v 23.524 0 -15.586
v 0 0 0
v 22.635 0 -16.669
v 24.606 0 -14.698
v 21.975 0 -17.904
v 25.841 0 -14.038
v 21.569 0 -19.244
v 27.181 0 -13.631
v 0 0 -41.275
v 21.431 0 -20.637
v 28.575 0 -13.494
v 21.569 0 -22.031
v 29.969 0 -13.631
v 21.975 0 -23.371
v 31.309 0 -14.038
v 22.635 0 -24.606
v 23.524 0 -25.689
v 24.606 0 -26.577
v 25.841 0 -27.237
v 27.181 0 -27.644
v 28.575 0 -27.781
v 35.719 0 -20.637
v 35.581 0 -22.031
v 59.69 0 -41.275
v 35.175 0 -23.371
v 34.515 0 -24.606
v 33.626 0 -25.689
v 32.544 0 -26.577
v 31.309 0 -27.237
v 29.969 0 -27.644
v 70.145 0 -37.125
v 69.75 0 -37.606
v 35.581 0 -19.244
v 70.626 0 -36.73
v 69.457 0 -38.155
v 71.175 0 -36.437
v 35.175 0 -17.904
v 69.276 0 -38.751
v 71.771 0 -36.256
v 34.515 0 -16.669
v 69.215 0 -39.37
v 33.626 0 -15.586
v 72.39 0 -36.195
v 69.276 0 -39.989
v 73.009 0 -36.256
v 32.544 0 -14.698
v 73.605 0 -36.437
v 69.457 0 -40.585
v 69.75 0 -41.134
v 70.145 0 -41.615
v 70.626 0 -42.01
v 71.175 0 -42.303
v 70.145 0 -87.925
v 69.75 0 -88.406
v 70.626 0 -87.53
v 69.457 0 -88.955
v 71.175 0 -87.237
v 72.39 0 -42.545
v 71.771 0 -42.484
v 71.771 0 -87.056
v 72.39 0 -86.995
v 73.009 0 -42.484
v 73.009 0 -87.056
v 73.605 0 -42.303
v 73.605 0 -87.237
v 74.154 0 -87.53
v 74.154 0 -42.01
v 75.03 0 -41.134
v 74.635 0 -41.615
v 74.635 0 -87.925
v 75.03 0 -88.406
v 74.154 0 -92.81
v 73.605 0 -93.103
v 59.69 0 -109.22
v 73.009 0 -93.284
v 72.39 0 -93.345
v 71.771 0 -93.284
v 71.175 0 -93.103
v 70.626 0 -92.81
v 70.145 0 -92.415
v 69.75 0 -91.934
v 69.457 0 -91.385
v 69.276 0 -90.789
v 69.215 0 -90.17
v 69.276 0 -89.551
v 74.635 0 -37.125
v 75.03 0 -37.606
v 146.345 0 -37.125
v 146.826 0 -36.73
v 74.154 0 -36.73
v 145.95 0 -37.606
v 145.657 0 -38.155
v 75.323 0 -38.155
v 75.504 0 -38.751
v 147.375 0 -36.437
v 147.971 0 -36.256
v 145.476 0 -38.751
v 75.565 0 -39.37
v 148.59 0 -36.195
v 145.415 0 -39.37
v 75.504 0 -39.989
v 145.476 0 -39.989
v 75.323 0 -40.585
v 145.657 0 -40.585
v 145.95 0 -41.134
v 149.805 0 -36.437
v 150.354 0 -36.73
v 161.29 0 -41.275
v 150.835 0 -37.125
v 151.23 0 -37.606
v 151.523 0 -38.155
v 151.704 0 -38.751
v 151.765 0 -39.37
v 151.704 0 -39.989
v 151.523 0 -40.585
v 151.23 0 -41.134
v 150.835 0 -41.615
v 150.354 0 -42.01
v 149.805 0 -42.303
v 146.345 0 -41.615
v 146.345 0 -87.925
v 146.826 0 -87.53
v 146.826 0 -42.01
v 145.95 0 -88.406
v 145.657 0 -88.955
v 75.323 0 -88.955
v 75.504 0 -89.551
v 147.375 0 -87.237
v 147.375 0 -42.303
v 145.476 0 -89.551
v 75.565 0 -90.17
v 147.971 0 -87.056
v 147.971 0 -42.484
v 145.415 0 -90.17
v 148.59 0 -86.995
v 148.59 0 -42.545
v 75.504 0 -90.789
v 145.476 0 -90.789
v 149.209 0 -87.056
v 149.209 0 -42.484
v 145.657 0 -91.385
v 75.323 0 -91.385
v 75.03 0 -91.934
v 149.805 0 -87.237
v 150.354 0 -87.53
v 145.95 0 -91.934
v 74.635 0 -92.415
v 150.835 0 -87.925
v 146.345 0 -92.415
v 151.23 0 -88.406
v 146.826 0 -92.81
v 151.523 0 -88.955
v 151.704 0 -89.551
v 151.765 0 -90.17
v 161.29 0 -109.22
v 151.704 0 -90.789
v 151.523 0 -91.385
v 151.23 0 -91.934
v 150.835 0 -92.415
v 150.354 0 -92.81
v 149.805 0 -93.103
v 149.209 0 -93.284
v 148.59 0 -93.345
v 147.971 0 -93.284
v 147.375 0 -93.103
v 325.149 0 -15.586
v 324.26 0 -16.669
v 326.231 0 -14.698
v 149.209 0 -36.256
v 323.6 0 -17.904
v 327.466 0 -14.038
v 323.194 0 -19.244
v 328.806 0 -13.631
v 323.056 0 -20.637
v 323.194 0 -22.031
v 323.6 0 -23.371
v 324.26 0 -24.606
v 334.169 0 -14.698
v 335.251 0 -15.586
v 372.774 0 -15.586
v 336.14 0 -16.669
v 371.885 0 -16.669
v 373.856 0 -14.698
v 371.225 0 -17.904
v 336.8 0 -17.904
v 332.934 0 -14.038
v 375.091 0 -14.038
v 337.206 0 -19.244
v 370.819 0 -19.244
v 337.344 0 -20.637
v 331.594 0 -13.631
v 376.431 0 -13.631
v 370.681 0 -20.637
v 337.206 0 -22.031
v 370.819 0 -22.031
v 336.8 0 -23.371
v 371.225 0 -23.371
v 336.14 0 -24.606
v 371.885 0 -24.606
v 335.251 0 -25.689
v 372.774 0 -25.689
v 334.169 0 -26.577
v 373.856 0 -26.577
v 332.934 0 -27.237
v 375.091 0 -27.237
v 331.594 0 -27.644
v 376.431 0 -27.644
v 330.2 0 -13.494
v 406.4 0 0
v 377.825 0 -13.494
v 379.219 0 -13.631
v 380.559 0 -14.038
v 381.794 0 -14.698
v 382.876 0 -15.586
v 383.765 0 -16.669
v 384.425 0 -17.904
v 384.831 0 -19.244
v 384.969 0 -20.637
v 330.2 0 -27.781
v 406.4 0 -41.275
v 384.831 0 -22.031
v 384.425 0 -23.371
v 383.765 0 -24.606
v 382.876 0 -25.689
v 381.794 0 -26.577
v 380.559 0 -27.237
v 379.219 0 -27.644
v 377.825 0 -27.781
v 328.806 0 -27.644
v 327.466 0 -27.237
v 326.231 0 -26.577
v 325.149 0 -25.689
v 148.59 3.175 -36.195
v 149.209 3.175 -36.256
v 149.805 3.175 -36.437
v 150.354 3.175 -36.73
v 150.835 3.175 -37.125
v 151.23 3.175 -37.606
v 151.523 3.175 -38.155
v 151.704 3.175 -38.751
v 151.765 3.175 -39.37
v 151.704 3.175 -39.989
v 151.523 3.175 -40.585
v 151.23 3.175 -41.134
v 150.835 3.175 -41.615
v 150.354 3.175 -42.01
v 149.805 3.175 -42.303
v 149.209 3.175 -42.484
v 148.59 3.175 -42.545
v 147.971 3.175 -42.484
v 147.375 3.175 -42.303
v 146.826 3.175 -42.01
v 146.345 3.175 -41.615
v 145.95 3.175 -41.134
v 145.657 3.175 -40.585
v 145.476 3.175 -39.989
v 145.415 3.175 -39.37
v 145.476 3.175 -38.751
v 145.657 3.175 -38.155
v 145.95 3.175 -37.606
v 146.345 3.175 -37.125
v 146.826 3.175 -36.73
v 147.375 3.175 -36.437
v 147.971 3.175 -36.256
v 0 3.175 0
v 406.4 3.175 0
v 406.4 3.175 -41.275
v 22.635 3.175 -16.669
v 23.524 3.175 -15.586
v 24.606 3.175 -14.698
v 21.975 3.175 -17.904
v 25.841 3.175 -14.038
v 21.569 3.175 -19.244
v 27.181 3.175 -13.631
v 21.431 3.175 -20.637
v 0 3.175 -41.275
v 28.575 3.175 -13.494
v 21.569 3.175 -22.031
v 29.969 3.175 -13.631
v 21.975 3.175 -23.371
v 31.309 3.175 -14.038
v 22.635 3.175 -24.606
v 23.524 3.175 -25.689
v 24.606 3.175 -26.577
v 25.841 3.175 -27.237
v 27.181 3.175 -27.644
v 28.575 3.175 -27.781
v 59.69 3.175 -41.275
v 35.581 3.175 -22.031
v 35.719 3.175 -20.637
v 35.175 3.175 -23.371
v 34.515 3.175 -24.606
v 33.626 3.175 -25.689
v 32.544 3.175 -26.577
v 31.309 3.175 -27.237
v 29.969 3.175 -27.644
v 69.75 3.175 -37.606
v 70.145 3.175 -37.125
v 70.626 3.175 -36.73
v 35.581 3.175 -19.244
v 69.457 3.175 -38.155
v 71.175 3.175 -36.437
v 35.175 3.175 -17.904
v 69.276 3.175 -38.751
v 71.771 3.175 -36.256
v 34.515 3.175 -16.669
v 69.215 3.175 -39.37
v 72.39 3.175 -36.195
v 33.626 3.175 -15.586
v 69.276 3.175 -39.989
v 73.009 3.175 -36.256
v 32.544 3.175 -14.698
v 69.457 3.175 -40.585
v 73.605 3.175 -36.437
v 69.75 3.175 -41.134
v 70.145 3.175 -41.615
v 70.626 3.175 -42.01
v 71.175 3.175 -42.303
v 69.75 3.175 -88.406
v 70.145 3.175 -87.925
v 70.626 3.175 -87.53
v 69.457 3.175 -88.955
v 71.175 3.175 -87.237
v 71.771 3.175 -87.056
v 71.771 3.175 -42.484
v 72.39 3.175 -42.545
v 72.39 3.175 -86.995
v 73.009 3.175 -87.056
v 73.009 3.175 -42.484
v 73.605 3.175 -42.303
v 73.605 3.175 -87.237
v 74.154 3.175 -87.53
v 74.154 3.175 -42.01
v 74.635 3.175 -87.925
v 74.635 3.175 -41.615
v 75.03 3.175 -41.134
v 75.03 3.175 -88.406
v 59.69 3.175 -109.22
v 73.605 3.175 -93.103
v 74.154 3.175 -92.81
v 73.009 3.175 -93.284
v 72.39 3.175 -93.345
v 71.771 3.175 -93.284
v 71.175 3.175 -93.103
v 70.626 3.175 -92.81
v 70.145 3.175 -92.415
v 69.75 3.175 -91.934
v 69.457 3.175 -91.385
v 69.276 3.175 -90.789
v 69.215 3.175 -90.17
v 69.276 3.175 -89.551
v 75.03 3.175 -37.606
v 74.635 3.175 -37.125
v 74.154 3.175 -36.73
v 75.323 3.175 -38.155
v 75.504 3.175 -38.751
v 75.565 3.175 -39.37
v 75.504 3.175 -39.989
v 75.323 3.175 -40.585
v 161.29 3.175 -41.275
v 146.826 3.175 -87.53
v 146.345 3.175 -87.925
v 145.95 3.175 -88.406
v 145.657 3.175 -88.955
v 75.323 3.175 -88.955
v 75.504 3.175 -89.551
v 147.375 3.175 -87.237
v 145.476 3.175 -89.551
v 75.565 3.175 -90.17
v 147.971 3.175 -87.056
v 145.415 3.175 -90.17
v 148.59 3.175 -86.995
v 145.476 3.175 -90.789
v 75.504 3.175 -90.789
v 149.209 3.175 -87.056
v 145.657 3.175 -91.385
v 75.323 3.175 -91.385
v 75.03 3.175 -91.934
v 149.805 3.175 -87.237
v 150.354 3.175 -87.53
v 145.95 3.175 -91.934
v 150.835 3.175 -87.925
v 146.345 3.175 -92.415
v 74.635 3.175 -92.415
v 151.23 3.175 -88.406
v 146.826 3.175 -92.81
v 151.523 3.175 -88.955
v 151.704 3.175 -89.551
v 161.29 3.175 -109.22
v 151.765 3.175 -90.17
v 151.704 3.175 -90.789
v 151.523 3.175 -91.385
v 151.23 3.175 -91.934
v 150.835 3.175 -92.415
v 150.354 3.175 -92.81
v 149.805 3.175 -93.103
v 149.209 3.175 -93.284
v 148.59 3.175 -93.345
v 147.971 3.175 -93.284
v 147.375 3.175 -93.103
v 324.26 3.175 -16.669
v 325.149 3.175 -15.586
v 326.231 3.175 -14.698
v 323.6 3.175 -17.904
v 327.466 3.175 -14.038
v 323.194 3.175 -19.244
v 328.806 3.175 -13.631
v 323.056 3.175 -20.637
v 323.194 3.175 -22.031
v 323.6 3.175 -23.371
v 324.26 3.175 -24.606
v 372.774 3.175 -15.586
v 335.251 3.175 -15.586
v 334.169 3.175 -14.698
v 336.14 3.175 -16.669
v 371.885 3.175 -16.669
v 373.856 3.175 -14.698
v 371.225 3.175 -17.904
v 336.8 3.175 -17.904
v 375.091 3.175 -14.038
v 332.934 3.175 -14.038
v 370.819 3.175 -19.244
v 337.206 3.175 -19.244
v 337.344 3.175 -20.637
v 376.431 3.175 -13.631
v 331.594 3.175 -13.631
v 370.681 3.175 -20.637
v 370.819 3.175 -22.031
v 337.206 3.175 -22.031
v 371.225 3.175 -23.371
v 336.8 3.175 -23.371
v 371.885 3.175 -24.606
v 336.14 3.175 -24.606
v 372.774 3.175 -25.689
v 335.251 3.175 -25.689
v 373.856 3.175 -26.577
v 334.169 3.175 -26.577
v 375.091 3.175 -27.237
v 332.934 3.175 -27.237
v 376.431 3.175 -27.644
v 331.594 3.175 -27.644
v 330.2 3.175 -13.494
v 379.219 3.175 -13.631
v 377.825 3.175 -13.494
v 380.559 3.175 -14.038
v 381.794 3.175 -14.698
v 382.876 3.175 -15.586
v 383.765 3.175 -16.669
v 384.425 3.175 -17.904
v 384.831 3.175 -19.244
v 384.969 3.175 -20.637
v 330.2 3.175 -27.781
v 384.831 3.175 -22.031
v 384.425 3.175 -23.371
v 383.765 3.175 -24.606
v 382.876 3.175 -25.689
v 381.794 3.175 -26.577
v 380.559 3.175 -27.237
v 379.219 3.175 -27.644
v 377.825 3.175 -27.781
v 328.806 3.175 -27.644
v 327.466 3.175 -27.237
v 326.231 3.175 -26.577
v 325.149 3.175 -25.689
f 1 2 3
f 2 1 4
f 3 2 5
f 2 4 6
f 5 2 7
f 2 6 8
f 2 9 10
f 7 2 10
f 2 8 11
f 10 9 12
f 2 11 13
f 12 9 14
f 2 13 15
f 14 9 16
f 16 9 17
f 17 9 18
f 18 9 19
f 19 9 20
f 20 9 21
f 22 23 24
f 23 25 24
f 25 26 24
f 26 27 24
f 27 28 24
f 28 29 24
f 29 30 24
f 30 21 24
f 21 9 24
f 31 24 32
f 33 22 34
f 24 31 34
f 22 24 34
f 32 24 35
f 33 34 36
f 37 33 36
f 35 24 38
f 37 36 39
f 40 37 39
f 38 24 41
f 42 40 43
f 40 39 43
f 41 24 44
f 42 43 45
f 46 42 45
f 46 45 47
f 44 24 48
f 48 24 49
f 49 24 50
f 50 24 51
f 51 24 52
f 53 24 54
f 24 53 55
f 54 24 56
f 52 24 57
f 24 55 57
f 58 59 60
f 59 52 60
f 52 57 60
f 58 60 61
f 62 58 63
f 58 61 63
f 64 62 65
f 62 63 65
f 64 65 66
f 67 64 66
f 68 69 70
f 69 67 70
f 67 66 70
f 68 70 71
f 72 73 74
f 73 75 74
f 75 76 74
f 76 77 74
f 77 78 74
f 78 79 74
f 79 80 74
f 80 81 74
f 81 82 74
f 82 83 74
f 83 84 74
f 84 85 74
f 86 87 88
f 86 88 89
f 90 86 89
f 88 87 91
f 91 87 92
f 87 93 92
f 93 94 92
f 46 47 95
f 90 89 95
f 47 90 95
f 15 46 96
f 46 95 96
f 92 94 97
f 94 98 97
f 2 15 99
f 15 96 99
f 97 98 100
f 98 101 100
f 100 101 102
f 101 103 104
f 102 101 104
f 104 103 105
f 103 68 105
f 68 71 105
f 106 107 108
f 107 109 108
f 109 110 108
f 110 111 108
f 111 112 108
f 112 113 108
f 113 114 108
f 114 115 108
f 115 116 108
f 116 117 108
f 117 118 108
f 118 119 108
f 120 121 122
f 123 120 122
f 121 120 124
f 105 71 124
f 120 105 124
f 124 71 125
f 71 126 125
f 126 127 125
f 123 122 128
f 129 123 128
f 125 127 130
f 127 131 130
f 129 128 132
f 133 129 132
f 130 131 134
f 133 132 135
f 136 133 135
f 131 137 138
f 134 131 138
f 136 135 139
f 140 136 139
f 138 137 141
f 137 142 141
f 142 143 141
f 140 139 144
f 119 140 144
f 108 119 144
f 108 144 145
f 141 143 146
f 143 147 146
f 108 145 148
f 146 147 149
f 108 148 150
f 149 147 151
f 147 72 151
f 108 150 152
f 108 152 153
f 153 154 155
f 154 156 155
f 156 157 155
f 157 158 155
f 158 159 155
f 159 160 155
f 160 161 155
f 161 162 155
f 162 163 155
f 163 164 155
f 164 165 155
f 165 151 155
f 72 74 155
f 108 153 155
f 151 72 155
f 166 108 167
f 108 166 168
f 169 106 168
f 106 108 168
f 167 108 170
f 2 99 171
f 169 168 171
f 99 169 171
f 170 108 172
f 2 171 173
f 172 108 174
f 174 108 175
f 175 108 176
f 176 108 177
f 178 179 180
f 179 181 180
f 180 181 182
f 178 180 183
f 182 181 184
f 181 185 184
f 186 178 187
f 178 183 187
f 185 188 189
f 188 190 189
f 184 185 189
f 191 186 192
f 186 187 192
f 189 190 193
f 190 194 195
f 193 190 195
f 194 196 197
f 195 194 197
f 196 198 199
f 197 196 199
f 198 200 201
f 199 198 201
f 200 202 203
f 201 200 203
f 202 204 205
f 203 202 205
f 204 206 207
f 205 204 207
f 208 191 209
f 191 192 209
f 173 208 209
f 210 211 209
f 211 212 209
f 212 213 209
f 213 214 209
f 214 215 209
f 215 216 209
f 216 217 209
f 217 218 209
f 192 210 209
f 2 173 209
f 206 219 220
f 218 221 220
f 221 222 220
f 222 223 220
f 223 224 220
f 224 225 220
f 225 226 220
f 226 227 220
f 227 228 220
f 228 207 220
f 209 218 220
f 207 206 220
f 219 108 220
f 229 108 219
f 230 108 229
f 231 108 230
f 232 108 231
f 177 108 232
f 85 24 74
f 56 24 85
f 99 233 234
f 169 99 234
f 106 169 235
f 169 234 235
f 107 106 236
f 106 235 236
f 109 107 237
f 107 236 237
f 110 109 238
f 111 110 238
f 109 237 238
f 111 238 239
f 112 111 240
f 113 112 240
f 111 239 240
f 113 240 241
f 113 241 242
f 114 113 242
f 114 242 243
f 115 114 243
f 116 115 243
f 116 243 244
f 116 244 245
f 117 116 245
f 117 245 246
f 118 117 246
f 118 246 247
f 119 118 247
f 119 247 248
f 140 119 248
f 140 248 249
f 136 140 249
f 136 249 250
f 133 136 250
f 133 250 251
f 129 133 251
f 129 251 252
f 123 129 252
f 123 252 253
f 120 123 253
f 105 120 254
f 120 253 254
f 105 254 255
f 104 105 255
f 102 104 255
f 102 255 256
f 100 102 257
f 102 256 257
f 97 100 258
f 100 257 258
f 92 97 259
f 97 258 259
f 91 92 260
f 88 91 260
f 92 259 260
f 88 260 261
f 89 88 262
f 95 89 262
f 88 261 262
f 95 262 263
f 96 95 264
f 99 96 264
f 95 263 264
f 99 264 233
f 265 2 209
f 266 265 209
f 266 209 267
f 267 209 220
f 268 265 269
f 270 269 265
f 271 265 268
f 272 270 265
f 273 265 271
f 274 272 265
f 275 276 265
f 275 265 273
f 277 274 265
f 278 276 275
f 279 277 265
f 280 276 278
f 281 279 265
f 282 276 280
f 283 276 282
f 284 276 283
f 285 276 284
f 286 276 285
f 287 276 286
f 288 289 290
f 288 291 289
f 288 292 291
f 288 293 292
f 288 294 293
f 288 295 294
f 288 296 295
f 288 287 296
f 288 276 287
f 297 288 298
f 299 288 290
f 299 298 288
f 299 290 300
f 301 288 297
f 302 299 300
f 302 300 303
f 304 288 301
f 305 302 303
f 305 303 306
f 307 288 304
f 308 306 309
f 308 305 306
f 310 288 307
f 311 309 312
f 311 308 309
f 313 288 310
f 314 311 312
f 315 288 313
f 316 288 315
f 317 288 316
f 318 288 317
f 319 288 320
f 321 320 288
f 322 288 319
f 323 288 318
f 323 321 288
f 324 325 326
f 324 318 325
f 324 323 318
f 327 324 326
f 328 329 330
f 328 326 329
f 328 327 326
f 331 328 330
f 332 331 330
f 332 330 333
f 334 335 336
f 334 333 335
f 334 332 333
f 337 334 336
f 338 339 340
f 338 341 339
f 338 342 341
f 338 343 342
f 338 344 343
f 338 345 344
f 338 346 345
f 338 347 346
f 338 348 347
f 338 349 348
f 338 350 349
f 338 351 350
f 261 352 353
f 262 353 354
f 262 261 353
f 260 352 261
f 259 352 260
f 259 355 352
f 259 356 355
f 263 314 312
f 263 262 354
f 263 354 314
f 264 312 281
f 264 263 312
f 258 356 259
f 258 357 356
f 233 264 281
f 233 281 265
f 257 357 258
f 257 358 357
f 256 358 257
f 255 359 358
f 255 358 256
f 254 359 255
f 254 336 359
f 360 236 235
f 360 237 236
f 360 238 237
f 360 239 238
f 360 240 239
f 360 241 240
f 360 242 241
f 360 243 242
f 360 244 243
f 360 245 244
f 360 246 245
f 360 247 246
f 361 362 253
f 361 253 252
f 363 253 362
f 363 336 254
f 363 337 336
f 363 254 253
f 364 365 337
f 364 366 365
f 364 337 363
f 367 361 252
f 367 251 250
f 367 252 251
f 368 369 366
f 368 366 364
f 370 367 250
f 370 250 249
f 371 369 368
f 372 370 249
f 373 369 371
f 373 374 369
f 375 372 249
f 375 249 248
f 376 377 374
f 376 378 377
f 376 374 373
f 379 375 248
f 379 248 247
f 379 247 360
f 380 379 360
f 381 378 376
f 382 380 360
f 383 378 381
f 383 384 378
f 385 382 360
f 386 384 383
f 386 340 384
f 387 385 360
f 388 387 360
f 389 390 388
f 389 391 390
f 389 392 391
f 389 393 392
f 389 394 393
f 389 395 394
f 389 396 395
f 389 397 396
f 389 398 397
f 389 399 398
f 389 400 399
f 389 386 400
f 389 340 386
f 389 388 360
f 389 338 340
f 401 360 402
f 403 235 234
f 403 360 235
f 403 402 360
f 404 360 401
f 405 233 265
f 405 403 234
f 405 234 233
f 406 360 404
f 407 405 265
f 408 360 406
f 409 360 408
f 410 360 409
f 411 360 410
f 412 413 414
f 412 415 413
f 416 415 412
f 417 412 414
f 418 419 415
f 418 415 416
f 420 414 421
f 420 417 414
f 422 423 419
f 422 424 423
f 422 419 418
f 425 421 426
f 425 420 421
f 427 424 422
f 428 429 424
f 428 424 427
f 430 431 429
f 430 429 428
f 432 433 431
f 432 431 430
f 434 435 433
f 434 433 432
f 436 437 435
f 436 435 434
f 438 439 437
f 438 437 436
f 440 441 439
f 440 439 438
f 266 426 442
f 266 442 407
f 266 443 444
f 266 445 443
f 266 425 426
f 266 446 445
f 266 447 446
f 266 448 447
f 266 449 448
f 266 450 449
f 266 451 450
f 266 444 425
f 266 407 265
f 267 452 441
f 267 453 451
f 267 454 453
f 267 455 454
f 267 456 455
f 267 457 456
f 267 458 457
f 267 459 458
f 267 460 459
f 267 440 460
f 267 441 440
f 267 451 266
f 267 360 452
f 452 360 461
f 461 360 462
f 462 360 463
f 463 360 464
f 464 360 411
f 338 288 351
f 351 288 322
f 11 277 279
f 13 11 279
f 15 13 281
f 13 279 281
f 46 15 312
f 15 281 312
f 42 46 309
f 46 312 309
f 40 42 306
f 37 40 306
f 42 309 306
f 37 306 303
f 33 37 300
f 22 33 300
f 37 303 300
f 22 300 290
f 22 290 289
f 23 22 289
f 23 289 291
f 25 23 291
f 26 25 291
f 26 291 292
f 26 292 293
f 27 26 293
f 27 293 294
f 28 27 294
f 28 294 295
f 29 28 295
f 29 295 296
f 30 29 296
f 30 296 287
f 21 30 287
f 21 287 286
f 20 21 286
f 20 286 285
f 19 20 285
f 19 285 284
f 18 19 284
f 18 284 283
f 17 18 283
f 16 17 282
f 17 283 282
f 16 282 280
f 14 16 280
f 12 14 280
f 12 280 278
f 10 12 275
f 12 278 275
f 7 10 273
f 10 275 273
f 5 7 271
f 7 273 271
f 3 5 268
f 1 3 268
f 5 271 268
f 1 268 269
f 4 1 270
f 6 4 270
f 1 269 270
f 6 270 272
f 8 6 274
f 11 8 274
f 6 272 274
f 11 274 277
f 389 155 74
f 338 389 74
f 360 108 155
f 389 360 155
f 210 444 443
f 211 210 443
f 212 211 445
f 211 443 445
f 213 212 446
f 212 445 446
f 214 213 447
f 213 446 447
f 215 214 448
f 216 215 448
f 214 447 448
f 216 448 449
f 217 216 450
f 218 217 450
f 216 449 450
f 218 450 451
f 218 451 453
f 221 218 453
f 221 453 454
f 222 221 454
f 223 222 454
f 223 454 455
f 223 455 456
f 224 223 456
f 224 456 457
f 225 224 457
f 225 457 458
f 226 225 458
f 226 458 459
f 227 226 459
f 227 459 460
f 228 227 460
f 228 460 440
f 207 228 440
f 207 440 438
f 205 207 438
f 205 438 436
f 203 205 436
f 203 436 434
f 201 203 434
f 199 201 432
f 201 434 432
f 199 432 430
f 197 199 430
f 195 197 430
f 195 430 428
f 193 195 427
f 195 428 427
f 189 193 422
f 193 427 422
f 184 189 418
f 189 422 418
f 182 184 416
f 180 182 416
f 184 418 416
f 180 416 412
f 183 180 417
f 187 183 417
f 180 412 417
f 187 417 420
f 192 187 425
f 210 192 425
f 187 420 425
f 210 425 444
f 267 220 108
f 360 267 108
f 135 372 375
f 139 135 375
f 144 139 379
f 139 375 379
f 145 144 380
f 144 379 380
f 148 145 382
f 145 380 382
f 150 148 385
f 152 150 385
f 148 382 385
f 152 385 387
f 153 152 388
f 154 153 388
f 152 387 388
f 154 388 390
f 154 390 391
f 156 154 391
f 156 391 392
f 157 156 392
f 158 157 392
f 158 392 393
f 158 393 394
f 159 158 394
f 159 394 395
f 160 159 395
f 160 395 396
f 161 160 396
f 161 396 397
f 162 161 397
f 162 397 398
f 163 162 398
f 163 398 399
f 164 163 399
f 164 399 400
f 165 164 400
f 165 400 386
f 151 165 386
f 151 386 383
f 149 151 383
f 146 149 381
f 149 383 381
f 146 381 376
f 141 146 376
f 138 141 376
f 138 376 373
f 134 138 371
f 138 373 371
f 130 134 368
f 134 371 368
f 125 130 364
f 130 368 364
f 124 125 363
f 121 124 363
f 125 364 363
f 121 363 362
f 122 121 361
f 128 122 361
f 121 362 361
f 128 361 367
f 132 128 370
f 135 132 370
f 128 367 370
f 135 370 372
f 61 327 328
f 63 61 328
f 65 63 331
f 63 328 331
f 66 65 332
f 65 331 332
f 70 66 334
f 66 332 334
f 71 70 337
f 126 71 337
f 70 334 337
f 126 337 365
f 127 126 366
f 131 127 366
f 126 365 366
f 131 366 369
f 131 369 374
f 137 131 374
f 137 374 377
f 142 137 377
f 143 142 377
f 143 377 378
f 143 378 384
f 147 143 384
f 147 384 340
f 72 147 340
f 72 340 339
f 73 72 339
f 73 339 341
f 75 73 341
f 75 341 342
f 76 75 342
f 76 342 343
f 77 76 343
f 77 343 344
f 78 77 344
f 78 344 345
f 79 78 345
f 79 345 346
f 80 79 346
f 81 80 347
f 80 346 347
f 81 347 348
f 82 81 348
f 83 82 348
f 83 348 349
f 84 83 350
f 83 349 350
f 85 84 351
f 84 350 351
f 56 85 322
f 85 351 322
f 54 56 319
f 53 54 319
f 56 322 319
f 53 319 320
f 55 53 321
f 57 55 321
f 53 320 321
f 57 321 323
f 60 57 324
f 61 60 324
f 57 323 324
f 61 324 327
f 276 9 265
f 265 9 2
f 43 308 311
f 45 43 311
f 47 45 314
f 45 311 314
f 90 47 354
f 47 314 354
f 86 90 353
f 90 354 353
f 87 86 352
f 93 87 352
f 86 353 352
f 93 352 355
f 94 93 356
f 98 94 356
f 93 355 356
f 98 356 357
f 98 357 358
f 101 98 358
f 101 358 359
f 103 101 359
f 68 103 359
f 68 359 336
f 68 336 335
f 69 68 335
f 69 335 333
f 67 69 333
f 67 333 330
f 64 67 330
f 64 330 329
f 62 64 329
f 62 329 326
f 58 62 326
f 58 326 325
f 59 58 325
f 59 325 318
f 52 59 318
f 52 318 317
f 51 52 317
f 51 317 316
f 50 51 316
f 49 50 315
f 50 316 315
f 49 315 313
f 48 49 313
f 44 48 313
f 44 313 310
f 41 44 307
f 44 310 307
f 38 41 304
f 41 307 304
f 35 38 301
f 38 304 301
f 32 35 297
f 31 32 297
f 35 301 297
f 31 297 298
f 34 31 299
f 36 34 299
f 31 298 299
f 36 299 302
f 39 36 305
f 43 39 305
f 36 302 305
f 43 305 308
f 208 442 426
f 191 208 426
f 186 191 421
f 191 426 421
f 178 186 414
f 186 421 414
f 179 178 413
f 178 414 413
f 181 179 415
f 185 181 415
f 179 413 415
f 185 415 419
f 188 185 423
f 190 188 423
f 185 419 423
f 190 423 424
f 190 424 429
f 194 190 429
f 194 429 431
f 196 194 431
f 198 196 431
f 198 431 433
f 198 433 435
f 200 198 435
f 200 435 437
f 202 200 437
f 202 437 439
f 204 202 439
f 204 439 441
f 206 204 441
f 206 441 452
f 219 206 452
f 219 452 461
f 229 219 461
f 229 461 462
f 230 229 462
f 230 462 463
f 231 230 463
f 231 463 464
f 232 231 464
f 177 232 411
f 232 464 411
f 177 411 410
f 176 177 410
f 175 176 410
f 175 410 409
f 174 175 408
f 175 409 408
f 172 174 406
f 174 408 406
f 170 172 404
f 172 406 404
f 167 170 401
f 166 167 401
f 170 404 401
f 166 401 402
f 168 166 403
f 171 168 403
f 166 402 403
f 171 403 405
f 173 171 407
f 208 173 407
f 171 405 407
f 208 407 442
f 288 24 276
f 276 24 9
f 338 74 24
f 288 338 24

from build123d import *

# Parameters (mm, degrees)
BOSS_EXTRUDE1_DEPTH = 3.175
SKETCH2_R           = 7.14375
SKETCH2_R_2         = 3.175
CUT_EXTRUDE1_DEPTH  = 421.832566498


with BuildPart() as part:
    # Sketch1 → Boss-Extrude1 (new body)
    with BuildSketch(Plane(origin=(0, 0, 0), x_dir=(1, 0, 0), z_dir=(0, 1, 0))):
        Polygon((0, 0), (406.4, 0), (406.4, 41.275), (161.29, 41.275), (161.29, 109.22), (59.69, 109.22), (59.69, 41.275), (0, 41.275), align=None)
    extrude(amount=BOSS_EXTRUDE1_DEPTH)

    # Sketch2 → Cut-Extrude1 (cut, through all)
    with BuildSketch(Plane(origin=(0, 3.175, 0), x_dir=(1, 0, 0), z_dir=(0, 1, 0))):
        with Locations(Location((28.575, 20.6375, 0), (0, 0, 270))):
            Circle(SKETCH2_R)
        with Locations(Location((72.39, 90.17, 0), (0, 0, 270))):
            Circle(SKETCH2_R_2)
        with Locations(Location((330.2, 20.6375, 0), (0, 0, 270))):
            Circle(SKETCH2_R)
        with Locations(Location((377.825, 20.6375, 0), (0, 0, 270))):
            Circle(SKETCH2_R)
        with Locations(Location((72.39, 39.37, 0), (0, 0, 270))):
            Circle(SKETCH2_R_2)
        with Locations(Location((148.59, 39.37, 0), (0, 0, 270))):
            Circle(SKETCH2_R_2)
        with Locations(Location((148.59, 90.17, 0), (0, 0, 270))):
            Circle(SKETCH2_R_2)
    extrude(amount=-CUT_EXTRUDE1_DEPTH, mode=Mode.SUBTRACT)


solid = part.part
